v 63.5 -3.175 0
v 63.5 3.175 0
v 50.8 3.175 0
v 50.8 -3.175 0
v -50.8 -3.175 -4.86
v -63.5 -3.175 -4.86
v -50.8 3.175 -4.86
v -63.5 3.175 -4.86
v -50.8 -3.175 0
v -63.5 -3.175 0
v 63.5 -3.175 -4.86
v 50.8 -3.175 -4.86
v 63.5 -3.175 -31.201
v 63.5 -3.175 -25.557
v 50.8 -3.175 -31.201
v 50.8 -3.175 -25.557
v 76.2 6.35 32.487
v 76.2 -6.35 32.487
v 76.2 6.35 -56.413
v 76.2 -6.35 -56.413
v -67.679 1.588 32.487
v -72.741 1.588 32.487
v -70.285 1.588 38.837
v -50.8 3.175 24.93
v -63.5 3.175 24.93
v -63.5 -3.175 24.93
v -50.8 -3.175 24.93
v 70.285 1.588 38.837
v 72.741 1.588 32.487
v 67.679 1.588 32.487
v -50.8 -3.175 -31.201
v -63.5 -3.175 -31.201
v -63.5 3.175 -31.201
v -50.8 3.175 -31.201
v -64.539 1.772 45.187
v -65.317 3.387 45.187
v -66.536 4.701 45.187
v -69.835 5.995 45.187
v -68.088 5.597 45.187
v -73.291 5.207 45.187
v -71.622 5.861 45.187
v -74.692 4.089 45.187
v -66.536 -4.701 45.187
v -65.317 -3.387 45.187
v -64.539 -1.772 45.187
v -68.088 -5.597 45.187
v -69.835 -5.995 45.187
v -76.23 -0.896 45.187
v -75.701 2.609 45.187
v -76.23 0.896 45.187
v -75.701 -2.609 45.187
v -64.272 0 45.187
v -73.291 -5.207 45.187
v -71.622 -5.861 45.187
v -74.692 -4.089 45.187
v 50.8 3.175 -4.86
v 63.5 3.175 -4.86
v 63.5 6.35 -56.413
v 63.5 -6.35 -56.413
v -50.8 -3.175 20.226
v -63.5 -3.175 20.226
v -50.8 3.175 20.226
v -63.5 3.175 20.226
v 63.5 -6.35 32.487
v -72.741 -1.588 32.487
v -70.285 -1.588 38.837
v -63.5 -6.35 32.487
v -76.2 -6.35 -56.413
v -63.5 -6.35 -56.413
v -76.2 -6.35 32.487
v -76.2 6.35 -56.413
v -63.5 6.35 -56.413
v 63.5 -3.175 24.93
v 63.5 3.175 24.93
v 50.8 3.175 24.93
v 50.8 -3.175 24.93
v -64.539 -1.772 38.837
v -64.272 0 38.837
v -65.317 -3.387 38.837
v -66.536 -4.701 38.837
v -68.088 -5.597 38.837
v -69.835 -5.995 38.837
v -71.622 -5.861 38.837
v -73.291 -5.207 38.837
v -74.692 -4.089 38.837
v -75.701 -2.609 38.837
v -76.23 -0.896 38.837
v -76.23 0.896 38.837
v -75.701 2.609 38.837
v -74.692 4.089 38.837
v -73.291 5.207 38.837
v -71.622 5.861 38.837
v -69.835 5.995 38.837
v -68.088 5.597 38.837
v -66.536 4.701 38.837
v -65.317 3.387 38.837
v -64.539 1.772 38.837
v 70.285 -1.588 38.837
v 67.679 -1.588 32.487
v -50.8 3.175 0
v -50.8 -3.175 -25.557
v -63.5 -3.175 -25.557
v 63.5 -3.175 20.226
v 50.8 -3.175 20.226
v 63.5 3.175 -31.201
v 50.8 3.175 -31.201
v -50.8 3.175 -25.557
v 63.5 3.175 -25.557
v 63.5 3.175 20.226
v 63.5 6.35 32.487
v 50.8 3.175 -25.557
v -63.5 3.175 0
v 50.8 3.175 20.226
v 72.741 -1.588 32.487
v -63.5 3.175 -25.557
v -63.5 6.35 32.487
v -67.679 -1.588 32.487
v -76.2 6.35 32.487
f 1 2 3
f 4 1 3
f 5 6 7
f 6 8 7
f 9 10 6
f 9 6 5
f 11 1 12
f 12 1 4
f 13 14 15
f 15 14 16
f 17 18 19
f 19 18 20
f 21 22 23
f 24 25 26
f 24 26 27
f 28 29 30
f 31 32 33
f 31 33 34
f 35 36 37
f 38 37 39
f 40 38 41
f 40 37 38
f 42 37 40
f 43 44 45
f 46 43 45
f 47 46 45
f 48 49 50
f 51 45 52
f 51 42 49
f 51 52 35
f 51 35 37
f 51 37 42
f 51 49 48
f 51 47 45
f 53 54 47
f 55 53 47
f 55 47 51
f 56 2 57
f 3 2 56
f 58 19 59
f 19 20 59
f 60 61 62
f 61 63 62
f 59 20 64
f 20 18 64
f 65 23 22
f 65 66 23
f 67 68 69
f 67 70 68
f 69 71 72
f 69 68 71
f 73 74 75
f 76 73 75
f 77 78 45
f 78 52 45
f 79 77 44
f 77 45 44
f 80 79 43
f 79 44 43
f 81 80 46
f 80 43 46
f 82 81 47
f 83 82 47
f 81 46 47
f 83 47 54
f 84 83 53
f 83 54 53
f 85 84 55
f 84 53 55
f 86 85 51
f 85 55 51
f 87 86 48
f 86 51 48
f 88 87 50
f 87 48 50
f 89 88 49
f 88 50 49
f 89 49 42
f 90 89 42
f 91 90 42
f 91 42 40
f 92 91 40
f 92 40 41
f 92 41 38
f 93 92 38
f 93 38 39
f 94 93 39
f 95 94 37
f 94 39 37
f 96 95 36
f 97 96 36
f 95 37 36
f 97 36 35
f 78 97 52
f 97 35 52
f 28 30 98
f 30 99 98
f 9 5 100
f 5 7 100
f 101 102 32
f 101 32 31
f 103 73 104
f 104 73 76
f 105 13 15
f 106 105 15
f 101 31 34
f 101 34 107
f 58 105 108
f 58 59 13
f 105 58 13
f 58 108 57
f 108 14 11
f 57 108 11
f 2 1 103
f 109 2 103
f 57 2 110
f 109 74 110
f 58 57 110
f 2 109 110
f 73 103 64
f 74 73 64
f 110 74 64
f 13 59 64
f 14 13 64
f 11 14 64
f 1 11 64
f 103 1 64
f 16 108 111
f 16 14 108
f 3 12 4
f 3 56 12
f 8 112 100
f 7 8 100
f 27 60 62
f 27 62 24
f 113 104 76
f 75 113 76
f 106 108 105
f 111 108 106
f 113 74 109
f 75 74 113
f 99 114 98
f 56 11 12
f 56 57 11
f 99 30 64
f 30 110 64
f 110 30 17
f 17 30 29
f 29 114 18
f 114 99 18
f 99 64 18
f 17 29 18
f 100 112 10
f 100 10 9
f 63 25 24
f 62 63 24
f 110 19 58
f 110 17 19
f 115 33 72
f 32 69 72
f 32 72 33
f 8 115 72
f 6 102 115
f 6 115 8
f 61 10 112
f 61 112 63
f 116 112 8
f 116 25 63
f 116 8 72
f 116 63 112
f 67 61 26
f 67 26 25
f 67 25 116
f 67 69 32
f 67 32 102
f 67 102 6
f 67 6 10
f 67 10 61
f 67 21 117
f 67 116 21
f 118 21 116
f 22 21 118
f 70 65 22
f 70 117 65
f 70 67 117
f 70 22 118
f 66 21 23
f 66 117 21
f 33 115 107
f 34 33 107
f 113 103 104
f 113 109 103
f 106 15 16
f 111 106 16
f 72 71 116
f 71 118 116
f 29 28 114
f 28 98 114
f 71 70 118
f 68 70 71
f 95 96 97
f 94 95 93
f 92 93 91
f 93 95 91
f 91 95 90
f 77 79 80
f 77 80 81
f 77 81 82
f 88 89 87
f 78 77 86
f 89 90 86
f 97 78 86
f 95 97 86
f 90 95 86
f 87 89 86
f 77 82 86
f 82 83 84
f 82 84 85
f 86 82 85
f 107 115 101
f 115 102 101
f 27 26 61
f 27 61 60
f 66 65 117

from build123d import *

# Parameters (mm, degrees)
F1_DEPTH = 6.35
F0_W     = 12.7
F0_H     = 4.7037045424
F0_H_2   = 4.8604938446
F0_H_3   = 5.6444450735
F2_DEPTH = 3.175
F0_W_2   = 6.0121872838
F0_H_4   = 6.35
F4_DEPTH = 1.5875


with BuildPart() as f1:
    # F0 (on Front) → F1 (new body, symmetric)
    with BuildSketch(Plane.XZ):
        Polygon((-76.2, -56.4129777904), (-63.5, -56.4129777904), (-63.5, -31.2012367346), (-63.5, -25.5567916611), (-63.5, -4.8604938446), (-63.5, 0), (-63.5, 20.2259261356), (-63.5, 24.929630678), (-63.5, 32.4870222096), (-67.6794573665, 32.4870222096), (-72.7410018444, 32.4870222096), (-76.2, 32.4870222096), align=None)
    extrude(amount=F1_DEPTH, both=True)

    # F0 (on Front) → F2 (join, symmetric)
    with BuildSketch(Plane.XZ):
        with Locations((-57.15, 22.5777784068)):
            Rectangle(F0_W, F0_H)
        with Locations((-57.15, -2.4302469223)):
            Rectangle(F0_W, F0_H_2)
        with Locations((-57.15, -28.3790141978)):
            Rectangle(F0_W, F0_H_3)
    extrude(amount=F2_DEPTH, both=True)

    # F0 (on Front) → F4 (join, symmetric)
    with BuildSketch(Plane.XZ):
        Polygon((-70.2845623006, 38.8370222096), (-72.7410018444, 32.4870222096), (-67.6794573665, 32.4870222096), align=None)
    extrude(amount=F4_DEPTH, both=True)


with BuildPart() as f3:
    # F0 (on Front) → F3 (revolve)
    with BuildSketch(Plane.XZ):
        with Locations((-67.2784686587, 42.0120222096)):
            Rectangle(F0_W_2, F0_H_4)
    revolve(axis=Axis((-70.2845623006, 0, 42.0120222096), (0, 0, -1)))


with BuildPart() as f5_1:
    # F5: instance of F1
    add(f1.part.mirror(Plane.YZ))


solid = Compound([f1.part, f3.part, f5_1.part])
